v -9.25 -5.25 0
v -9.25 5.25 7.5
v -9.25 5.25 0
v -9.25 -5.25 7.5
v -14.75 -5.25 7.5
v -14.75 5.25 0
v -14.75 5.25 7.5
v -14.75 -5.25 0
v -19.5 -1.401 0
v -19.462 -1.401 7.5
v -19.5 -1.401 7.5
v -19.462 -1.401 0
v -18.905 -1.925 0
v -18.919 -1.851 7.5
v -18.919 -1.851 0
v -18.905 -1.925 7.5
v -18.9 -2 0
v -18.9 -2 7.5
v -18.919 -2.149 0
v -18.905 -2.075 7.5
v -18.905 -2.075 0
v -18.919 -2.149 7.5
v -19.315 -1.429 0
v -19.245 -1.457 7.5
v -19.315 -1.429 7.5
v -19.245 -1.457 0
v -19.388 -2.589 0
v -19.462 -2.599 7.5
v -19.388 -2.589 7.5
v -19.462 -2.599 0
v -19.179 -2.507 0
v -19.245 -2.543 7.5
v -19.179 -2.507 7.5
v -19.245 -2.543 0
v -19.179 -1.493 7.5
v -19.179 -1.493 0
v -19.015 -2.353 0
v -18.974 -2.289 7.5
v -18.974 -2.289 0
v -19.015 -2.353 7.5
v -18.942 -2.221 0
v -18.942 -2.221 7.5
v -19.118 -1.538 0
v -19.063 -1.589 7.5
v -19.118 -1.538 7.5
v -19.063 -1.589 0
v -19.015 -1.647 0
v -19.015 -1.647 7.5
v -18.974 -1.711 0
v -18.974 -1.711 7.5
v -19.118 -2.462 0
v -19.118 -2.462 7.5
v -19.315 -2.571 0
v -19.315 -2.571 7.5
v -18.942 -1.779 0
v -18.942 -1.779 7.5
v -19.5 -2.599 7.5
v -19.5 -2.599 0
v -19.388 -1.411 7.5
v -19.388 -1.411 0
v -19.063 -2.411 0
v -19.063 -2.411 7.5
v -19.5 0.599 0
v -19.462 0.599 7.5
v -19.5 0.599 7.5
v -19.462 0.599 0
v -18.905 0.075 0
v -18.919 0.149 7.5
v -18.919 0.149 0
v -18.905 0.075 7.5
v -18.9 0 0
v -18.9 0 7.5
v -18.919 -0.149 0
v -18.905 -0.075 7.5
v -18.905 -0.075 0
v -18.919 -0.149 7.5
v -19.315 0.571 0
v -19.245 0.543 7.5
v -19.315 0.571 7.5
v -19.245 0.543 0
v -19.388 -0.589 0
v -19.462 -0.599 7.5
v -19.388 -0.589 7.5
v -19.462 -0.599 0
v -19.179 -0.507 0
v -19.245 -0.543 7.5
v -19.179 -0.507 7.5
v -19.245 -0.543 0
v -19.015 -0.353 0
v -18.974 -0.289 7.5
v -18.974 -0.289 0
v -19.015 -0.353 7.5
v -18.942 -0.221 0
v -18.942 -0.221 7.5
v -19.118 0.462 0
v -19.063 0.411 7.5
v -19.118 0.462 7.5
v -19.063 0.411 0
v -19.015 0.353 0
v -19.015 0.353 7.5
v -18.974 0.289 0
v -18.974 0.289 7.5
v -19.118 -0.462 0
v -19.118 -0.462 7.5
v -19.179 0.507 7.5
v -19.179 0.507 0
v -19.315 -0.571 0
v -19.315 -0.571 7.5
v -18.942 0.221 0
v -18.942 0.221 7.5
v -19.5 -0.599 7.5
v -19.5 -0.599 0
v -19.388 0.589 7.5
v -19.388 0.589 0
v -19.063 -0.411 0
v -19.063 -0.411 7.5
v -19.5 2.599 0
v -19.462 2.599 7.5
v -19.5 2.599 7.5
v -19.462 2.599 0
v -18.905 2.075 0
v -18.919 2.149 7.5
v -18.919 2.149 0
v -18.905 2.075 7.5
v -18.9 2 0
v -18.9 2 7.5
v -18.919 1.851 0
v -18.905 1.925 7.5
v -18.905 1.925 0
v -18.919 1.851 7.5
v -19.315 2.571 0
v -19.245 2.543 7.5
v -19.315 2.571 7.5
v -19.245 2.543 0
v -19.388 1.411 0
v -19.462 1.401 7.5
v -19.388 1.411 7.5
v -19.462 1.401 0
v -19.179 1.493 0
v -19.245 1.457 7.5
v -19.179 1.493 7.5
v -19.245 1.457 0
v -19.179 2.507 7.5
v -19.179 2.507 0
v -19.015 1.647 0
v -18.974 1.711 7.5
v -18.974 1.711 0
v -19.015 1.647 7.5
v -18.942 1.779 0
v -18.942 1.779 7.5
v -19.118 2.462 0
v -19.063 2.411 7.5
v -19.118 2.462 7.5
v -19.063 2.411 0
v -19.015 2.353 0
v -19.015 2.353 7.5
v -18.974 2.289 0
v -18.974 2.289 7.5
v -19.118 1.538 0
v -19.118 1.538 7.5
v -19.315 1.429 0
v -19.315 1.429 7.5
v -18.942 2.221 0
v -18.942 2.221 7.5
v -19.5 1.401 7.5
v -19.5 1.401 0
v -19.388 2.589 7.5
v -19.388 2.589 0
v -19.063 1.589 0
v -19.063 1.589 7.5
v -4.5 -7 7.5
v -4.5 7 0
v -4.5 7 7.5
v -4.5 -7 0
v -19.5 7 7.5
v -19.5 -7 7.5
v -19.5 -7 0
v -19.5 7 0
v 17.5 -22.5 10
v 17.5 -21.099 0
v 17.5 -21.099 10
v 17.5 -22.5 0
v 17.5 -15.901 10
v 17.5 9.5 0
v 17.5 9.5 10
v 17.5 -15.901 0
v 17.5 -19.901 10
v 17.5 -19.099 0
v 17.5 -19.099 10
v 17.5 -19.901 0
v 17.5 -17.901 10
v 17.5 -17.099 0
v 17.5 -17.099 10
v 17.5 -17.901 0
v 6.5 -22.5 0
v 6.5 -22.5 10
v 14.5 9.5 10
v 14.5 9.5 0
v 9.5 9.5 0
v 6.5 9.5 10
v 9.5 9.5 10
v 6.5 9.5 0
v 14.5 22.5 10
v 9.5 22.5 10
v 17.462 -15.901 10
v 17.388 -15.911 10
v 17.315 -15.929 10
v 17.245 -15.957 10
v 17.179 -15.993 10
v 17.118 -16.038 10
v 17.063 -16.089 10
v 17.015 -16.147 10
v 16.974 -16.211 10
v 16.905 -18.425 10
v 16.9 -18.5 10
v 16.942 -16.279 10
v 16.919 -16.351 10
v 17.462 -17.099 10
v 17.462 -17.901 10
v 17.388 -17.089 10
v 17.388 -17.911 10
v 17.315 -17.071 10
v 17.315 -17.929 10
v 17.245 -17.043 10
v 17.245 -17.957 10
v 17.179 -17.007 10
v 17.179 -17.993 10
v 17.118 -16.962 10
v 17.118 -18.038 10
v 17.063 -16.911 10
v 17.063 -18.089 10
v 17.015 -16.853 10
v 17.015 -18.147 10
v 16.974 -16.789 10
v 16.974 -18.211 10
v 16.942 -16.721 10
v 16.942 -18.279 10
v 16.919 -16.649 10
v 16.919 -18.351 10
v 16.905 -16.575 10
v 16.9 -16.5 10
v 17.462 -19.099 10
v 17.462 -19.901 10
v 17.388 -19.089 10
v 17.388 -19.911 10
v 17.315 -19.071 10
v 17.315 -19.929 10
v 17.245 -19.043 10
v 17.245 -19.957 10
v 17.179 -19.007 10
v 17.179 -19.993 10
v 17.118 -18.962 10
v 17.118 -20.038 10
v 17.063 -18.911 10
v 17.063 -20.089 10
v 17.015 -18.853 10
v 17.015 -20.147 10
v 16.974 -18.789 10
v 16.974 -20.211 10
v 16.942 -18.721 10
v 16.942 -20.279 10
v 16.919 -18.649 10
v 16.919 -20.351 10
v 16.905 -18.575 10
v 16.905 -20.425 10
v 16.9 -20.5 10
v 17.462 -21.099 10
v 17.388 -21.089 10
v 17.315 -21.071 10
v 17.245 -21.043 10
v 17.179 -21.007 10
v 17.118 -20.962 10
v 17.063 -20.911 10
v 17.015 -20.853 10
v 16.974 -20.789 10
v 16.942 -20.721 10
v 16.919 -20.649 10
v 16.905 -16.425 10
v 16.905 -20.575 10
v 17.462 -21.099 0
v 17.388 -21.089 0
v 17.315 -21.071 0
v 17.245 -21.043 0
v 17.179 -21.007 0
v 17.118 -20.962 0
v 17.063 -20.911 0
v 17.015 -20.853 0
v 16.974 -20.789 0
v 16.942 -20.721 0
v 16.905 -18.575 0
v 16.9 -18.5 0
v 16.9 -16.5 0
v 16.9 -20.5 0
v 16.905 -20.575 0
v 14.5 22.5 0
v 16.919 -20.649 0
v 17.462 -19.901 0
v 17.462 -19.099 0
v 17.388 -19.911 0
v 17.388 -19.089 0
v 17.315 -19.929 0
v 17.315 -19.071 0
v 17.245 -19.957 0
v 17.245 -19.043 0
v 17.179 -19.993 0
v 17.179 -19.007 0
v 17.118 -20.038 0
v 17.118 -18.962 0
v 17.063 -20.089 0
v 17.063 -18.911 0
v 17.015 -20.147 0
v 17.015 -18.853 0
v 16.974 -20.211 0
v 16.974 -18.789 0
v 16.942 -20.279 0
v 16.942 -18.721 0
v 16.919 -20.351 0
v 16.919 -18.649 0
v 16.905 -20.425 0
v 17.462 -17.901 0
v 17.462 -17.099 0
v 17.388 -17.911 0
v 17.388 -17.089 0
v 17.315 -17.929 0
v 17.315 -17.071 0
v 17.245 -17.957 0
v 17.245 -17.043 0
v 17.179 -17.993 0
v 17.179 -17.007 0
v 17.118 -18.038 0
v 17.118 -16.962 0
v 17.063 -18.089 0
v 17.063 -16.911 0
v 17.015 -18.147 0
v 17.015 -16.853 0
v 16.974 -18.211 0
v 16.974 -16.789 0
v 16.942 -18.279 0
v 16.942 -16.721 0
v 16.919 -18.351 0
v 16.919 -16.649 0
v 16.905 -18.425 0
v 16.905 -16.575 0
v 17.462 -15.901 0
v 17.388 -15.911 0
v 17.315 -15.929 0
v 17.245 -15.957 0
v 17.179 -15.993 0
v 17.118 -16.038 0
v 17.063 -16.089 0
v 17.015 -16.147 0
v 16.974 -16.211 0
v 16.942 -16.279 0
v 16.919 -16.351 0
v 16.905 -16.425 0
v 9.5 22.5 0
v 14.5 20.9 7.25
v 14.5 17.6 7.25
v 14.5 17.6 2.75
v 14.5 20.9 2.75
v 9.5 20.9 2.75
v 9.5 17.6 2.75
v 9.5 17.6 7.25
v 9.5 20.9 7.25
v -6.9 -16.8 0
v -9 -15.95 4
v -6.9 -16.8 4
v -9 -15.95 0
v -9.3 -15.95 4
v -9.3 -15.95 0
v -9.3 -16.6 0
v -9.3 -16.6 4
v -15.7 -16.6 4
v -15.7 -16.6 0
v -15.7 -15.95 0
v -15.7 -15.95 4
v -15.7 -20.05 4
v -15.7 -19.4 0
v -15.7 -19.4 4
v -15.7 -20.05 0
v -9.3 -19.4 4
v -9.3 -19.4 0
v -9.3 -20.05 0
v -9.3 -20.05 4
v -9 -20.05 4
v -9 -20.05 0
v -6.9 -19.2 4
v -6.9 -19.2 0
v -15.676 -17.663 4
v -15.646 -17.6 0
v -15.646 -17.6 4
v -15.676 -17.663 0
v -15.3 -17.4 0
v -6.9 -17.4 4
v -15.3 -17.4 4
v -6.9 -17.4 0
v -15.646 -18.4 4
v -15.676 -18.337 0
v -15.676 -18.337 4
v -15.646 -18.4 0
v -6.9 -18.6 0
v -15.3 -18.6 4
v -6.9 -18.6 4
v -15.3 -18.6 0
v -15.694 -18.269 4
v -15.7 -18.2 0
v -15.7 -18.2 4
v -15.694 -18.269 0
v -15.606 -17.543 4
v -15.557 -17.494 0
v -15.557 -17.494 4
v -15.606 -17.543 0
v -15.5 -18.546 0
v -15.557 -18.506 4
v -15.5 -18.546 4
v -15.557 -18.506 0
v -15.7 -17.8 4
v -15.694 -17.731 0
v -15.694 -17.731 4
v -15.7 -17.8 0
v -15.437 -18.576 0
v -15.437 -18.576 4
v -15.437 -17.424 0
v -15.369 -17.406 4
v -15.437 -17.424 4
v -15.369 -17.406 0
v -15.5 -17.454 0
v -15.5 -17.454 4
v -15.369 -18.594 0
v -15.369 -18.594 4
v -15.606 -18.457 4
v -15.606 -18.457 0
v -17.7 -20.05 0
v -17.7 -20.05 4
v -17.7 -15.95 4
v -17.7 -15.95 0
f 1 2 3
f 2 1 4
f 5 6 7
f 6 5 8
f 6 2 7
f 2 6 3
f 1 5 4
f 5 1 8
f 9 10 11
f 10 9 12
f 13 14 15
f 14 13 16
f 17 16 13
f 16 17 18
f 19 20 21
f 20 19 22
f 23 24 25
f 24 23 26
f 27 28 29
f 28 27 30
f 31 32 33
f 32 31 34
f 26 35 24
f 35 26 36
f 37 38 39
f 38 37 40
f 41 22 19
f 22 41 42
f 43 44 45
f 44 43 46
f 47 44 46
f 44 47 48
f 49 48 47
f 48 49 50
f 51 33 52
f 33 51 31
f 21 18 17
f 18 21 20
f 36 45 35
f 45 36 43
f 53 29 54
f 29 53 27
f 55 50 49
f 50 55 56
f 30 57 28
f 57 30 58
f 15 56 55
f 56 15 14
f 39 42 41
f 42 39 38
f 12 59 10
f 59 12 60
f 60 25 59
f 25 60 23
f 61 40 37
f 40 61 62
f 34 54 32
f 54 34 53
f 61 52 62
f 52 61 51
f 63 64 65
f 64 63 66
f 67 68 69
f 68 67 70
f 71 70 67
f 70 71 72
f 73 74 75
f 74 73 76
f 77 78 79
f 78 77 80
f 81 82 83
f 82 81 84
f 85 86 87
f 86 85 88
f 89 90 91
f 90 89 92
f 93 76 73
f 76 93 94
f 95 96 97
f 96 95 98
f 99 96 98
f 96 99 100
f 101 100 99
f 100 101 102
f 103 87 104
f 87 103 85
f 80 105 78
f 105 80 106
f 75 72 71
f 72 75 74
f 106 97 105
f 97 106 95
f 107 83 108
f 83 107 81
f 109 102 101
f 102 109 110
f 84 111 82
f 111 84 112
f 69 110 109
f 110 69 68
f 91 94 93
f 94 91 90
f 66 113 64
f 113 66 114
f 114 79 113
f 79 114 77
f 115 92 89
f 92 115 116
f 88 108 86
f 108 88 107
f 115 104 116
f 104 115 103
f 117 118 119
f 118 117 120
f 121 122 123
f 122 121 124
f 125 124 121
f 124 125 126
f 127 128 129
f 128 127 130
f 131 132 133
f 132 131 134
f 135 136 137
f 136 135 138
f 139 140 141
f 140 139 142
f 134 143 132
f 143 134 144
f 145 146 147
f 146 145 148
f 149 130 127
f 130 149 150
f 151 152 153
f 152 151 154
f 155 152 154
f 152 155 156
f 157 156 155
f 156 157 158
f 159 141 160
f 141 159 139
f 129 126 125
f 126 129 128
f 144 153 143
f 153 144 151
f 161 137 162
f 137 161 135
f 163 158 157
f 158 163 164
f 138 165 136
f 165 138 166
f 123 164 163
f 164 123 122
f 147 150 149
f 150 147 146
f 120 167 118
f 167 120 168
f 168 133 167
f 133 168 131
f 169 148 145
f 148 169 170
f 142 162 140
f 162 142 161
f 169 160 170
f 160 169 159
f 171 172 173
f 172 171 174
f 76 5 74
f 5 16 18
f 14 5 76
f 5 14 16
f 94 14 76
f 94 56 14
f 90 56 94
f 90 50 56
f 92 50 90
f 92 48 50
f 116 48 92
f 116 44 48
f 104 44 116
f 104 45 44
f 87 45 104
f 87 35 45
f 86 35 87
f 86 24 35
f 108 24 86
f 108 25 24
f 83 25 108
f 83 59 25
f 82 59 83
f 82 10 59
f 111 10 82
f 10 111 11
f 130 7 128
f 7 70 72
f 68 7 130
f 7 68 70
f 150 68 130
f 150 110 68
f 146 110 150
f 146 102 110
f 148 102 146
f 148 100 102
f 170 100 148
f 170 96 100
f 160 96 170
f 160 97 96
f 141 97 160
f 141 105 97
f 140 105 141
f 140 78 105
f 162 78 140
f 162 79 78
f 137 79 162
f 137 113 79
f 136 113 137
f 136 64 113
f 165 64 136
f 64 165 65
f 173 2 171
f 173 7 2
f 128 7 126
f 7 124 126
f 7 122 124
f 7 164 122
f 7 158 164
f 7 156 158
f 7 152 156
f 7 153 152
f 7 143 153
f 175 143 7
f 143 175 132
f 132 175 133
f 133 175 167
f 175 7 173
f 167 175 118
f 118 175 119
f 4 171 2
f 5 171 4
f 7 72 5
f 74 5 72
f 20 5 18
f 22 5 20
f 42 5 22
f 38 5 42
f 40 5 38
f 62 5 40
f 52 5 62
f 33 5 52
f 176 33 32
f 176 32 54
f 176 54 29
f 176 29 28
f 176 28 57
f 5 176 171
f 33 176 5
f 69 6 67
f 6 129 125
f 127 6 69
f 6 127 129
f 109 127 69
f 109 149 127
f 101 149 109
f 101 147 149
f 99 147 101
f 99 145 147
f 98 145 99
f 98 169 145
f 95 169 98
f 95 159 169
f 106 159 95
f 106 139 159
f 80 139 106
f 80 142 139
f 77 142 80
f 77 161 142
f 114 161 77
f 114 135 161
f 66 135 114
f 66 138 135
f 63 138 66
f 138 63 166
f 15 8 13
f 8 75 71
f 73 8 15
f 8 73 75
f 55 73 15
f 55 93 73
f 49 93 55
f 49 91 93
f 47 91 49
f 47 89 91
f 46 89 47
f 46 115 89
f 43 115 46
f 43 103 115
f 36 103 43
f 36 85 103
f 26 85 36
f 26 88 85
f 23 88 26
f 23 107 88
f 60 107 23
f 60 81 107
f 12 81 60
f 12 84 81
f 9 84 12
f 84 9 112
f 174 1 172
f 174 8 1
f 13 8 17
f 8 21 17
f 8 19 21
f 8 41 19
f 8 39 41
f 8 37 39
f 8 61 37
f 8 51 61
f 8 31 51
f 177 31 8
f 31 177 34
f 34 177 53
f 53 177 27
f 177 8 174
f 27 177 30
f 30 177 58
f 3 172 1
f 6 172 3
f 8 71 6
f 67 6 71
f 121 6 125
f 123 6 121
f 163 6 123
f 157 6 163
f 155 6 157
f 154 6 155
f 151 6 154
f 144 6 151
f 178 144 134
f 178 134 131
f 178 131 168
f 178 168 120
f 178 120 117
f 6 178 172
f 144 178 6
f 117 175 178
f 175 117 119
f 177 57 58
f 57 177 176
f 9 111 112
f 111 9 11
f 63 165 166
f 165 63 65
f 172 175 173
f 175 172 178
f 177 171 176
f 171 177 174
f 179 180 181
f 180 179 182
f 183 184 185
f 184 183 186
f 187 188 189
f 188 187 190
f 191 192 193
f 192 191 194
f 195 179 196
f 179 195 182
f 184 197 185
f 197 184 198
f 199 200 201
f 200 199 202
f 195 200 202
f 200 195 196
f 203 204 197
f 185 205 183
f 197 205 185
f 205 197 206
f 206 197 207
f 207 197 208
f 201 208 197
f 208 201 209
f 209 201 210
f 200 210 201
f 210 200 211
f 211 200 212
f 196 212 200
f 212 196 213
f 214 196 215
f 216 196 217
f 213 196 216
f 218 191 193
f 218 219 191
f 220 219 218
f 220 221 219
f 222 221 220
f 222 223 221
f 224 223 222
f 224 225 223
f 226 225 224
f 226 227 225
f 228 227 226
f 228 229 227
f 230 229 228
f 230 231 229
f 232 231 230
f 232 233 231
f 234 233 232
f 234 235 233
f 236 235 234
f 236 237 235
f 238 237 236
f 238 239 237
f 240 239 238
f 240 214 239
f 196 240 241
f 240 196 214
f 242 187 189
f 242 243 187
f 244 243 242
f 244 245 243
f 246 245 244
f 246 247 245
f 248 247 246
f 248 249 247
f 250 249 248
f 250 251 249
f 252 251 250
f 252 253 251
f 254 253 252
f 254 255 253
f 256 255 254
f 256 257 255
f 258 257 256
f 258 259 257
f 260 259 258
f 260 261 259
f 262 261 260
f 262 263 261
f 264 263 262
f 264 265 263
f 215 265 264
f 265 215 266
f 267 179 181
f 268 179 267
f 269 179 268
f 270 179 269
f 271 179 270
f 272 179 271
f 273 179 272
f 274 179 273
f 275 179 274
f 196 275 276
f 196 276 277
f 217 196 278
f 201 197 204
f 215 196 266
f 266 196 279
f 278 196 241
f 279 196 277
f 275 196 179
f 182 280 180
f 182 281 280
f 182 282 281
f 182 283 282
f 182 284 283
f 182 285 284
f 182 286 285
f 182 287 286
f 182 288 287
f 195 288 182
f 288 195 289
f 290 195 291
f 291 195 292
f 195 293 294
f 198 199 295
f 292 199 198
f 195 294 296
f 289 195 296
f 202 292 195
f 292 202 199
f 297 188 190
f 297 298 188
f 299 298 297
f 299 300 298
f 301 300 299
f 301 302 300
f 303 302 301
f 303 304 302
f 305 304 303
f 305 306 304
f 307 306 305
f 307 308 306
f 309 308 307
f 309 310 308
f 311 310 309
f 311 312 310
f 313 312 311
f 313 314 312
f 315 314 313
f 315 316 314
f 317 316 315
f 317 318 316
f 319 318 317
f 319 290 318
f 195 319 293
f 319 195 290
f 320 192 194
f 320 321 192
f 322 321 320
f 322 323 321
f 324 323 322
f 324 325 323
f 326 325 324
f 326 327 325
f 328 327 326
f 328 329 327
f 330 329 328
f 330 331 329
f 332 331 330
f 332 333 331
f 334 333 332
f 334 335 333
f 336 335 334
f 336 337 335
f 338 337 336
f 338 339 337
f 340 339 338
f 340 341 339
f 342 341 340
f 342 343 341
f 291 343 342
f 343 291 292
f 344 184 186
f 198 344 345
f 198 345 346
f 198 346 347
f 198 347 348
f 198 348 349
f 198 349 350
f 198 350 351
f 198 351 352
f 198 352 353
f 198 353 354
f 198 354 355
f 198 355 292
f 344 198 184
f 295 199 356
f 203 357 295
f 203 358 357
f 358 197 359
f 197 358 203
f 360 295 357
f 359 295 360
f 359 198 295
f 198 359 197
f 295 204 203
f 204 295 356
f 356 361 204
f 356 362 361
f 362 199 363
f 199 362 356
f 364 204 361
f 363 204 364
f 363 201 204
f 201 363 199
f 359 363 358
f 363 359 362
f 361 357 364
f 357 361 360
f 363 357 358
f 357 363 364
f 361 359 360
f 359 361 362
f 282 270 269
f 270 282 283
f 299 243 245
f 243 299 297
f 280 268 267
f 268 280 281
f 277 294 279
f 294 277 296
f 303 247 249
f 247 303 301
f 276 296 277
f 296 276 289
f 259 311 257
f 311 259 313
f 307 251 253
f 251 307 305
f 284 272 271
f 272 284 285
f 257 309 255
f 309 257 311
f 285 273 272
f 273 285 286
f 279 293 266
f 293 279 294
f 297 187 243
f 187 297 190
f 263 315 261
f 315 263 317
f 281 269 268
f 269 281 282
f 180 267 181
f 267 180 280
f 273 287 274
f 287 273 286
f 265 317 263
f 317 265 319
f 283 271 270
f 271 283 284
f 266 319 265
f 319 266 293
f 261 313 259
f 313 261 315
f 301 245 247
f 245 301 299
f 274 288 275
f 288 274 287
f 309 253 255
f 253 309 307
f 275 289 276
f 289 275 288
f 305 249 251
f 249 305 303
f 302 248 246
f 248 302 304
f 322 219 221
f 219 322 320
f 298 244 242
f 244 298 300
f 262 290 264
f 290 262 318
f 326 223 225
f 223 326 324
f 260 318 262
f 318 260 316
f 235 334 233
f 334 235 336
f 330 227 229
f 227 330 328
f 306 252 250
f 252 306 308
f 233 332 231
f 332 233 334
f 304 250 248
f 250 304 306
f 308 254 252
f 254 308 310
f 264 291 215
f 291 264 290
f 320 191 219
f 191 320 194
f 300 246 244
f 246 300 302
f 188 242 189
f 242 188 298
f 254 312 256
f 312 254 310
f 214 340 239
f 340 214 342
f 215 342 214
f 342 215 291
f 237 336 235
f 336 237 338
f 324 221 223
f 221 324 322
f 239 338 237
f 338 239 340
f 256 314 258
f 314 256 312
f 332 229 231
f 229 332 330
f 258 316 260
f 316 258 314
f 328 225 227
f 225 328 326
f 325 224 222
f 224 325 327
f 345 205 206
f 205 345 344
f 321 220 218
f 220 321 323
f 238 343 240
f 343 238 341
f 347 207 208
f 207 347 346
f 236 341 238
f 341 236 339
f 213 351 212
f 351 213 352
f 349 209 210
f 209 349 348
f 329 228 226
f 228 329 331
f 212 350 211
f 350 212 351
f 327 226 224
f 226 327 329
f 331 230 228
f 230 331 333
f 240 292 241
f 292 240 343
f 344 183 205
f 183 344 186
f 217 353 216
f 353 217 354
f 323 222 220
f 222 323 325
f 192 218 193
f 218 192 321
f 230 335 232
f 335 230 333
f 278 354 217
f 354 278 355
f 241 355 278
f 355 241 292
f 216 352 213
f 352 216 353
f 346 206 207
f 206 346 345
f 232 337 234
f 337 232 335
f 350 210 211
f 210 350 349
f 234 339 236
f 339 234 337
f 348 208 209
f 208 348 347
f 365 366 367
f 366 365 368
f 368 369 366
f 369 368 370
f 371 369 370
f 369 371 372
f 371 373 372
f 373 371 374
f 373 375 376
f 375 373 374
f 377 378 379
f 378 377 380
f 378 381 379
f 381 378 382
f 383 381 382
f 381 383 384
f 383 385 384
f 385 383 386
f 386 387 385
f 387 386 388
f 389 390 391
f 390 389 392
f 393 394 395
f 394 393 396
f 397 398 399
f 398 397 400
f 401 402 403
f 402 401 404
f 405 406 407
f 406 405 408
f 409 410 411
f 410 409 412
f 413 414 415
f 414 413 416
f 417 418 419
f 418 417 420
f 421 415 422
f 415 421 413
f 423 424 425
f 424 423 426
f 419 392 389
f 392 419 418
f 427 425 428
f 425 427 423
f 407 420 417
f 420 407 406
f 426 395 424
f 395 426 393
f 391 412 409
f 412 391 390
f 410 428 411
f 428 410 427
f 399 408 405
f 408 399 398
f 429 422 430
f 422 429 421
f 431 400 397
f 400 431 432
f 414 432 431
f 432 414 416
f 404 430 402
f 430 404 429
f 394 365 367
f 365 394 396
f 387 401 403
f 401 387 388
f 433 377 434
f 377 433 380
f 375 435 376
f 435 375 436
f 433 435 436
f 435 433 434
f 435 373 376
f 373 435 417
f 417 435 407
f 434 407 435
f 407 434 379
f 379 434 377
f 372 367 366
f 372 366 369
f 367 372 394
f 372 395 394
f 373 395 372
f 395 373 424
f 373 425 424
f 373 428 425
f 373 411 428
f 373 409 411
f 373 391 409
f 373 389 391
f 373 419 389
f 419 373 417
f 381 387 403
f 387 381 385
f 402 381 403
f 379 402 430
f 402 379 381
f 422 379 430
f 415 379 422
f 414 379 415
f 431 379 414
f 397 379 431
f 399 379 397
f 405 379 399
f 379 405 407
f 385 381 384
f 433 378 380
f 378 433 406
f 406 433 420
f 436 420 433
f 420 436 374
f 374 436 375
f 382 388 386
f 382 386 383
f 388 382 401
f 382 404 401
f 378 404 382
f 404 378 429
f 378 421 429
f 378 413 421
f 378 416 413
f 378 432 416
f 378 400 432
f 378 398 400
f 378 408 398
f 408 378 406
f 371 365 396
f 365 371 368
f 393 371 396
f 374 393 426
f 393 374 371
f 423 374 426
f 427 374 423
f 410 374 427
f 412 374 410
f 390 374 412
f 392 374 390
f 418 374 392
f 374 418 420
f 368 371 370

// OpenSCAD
$fn = 50;

difference() {
	union() {
		translate(v = [-12, -5, 0]) {
			rotate(a = [0, 0, 0]) {
				difference() {
					union() {
						translate(v = [-7.5, -2.0, 0]) {
							cube(size = [15.0, 14.0, 7.5]);
						}
					}
					union() {
						translate(v = [-2.75, -0.25, -0.1]) {
							cube(size = [5.5, 10.5, 7.7]);
						}
						translate(v = [-7.5, 3, -0.1]) {
							cylinder(h = 7.7, r = 0.6);
						}
						translate(v = [-7.5, 5, -0.1]) {
							cylinder(h = 7.7, r = 0.6);
						}
						translate(v = [-7.5, 7, -0.1]) {
							cylinder(h = 7.7, r = 0.6);
						}
					}
				}
			}
		}
		translate(v = [12, 9.5, 0]) {
			rotate(a = [90, 0, 0]) {
				difference() {
					union() {
						translate(v = [-5.5, 0, 0]) {
							cube(size = [11.0, 10.0, 32.0]);
						}
						translate(v = [-2.5, 0, -13.0]) {
							cube(size = [5.0, 10.0, 13.1]);
						}
					}
					union() {
						translate(v = [-2.6, 2.75, -11.4]) {
							cube(size = [5.2, 4.5, 3.3]);
						}
						translate(v = [5.5, 10.1, 30.0]) {
							rotate(a = [90, 0, 0]) {
								cylinder(h = 10.2, r = 0.6);
							}
						}
						translate(v = [5.5, 10.1, 28.0]) {
							rotate(a = [90, 0, 0]) {
								cylinder(h = 10.2, r = 0.6);
							}
						}
						translate(v = [5.5, 10.1, 26.0]) {
							rotate(a = [90, 0, 0]) {
								cylinder(h = 10.2, r = 0.6);
							}
						}
					}
				}
			}
		}
		translate(v = [-12, -18, 0]) {
			rotate(a = [90, 0, 0]) {
				difference() {
					union() {
						translate(v = [-5.7, 0, -2.05]) {
							cube(size = [10.8, 4.0, 4.1]);
						}
					}
					union() {
						translate(v = [0, 4.1, 0]) {
							rotate(a = [90, 0, 0]) {
								linear_extrude(height = 4.2) {
									polygon(points = [[-3.7, -1.4], [2.7, -1.4], [2.7, -2.05], [3.0, -2.05], [5.1, -1.2], [5.2, -1.2], [5.2, -2.15], [-3.7, -2.15]]);
								}
							}
						}
						translate(v = [0, 4.1, 0]) {
							rotate(a = [90, 0, 0]) {
								linear_extrude(height = 4.2) {
									polygon(points = [[-3.7, 1.4], [2.7, 1.4], [2.7, 2.05], [3.0, 2.05], [5.1, 1.2], [5.2, 1.2], [5.2, 2.15], [-3.7, 2.15]]);
								}
							}
						}
						translate(v = [0, 4.1, 0]) {
							rotate(a = [90, 0, 0]) {
								linear_extrude(height = 4.2) {
									polygon(points = [[-3.7, 0.2], [-3.693923, 0.269459], [-3.675877, 0.336808], [-3.64641, 0.4], [-3.606418, 0.457115], [-3.557115, 0.506418], [-3.5, 0.54641], [-3.436808, 0.575877], [-3.369459, 0.593923], [-3.3, 0.6], [5.2, 0.6], [5.2, -0.6], [-3.3, -0.6], [-3.369459, -0.593923], [-3.436808, -0.575877], [-3.5, -0.54641], [-3.557115, -0.506418], [-3.606418, -0.457115], [-3.64641, -0.4], [-3.675877, -0.336808], [-3.693923, -0.269459], [-3.7, -0.2]]);
								}
							}
						}
					}
				}
			}
		}
	}
	union();
}
